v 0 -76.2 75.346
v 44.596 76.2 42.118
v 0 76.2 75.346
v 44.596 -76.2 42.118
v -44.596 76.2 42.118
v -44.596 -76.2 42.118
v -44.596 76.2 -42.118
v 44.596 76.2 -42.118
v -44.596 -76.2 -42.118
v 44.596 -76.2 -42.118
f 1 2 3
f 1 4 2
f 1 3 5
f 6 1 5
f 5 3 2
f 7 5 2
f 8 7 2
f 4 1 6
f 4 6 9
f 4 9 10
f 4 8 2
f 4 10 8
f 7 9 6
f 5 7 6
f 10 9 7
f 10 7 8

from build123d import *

# Parameters (mm, degrees)
F0_W     = 89.191474
F0_H     = 84.23639
F1_DEPTH = 76.2


with BuildPart() as f1:
    # F0 (on Front) → F1 (new body, symmetric)
    with BuildSketch(Plane.XZ):
        Polygon((0, 75.346395), (-44.595737, 42.118195), (44.595737, 42.118195), align=None)
        Rectangle(F0_W, F0_H)
    extrude(amount=F1_DEPTH, both=True)


solid = f1.part
